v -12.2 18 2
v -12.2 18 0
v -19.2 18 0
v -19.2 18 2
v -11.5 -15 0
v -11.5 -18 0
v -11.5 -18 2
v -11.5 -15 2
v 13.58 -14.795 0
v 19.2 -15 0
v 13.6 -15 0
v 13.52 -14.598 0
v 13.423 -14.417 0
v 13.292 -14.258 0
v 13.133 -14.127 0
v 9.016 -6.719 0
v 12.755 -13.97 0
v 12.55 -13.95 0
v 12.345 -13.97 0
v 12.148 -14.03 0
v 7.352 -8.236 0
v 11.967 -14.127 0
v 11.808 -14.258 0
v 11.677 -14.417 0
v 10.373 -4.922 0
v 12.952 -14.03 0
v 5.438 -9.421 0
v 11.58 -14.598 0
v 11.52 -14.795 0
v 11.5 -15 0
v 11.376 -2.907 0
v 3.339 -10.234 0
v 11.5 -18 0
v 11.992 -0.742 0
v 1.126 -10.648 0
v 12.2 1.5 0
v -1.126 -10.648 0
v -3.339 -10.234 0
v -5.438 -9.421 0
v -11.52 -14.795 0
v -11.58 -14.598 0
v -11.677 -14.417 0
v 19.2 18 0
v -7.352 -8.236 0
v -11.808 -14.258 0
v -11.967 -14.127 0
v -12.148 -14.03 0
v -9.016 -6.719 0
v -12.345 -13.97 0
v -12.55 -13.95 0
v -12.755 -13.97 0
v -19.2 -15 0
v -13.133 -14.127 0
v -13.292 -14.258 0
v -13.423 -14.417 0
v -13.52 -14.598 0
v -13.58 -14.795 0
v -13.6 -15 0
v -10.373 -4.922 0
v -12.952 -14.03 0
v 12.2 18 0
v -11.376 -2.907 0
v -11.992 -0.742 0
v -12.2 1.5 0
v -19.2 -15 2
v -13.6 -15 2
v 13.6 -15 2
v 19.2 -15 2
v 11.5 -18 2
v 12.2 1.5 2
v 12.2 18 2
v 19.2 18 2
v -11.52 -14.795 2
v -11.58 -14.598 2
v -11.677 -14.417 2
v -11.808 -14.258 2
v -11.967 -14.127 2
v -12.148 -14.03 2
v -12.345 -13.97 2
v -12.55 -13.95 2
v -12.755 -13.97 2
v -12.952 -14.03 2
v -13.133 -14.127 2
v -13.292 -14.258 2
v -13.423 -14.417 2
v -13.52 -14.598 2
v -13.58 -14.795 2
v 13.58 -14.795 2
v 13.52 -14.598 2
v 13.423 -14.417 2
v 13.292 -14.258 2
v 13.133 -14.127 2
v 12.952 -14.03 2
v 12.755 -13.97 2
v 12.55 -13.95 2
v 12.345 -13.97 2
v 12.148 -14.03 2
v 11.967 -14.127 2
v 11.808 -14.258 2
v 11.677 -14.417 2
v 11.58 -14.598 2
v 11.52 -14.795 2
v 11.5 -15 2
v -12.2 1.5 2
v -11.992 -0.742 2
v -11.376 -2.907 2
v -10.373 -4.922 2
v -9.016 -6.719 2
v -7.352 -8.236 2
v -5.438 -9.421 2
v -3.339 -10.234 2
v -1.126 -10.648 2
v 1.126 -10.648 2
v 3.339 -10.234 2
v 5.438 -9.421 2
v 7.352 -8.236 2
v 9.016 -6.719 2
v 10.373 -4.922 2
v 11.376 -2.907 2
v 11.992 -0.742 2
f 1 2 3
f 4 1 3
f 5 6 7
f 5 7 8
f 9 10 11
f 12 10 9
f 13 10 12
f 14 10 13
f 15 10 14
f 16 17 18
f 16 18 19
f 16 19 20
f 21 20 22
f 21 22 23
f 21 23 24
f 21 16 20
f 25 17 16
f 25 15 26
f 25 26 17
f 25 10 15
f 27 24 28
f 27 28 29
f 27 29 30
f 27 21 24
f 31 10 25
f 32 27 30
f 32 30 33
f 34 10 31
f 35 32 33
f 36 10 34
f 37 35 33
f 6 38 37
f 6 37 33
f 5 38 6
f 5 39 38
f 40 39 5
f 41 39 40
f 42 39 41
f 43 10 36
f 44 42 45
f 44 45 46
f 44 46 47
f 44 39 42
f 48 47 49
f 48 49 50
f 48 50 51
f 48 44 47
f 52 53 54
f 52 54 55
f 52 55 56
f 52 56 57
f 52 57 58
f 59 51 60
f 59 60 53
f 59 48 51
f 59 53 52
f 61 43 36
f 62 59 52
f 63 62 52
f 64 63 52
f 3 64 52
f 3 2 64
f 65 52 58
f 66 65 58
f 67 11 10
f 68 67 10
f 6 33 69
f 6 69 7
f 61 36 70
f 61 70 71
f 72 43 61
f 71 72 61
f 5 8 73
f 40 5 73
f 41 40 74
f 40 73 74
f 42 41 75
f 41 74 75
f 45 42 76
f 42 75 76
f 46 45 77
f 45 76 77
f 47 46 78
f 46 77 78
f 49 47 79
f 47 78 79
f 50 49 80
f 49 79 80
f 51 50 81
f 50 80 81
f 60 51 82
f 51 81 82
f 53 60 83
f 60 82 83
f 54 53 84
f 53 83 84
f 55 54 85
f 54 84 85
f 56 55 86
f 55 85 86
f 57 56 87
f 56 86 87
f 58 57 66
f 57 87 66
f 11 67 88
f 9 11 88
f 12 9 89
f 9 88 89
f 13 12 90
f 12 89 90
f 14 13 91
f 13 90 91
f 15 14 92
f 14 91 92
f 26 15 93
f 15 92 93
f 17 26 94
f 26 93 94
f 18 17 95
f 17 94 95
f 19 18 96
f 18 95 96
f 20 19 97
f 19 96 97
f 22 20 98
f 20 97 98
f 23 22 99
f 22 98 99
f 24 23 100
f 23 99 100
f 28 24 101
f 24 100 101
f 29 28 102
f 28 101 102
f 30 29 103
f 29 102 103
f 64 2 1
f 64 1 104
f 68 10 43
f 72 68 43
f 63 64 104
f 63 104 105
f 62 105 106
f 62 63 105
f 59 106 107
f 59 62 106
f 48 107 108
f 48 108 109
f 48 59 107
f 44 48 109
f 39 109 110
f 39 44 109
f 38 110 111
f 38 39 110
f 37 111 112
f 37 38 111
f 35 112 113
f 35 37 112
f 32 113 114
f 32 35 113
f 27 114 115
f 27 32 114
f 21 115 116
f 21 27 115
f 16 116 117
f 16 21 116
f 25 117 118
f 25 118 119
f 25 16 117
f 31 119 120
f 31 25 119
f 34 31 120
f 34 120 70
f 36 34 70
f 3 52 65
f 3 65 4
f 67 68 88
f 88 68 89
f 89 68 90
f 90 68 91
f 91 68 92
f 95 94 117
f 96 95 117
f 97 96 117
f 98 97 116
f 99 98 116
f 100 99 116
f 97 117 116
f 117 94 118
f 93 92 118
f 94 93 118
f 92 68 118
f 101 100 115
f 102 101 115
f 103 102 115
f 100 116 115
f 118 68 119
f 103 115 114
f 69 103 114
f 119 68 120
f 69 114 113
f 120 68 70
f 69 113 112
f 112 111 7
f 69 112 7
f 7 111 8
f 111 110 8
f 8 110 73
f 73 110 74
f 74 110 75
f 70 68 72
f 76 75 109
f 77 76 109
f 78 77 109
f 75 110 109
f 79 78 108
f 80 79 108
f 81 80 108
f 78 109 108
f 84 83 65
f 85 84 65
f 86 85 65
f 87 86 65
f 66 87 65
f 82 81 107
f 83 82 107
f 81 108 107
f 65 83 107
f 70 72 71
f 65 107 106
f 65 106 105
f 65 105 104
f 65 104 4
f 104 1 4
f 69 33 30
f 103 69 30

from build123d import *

# Parameters (mm, degrees)
SKETCH_1_W          = 38.4
SKETCH_1_H          = 30
EXTRUDE_1_DEPTH     = 2
CUT_EXTRUDE_1_DEPTH = 2
SKETCH_3_W          = 23
SKETCH_3_H          = 6
EXTRUDE_2_DEPTH     = 2
SKETCH_4_R          = 1.05
CUT_EXTRUDE_2_DEPTH = 2
SKETCH_5_W          = 7
SKETCH_5_H          = 3
EXTRUDE_3_DEPTH     = 2


with BuildPart() as part:
    # 草图1 → 凸台-拉伸1 (new body)
    with BuildSketch(Plane.XY):
        Rectangle(SKETCH_1_W, SKETCH_1_H)
    extrude(amount=EXTRUDE_1_DEPTH)

    # 草图2 → 切除-拉伸1 (cut)
    with BuildSketch(Plane(origin=(0, 0, 0), x_dir=(-1, 0, 0), z_dir=(0, 0, -1))):
        with BuildLine():
            Line((-12.2, 1.5), (-12.2, 15))
            Line((-12.2, 15), (12.2, 15))
            Line((12.2, 15), (12.2, 1.5))
            ThreePointArc((12.2, 1.5), (0, -10.7), (-12.2, 1.5))
        make_face()
    extrude(amount=-CUT_EXTRUDE_1_DEPTH, mode=Mode.SUBTRACT)

    # 草图3 → 凸台-拉伸2 (add)
    with BuildSketch(Plane(origin=(0, 0, 0), x_dir=(-1, 0, 0), z_dir=(0, 0, -1))):
        with Locations((0, -15)):
            Rectangle(SKETCH_3_W, SKETCH_3_H)
    extrude(amount=-EXTRUDE_2_DEPTH)

    # 草图4 → 切除-拉伸2 (cut)
    with BuildSketch(Plane.XY.offset(2)):
        with Locations((12.55, -15)):
            Circle(SKETCH_4_R)
        with Locations((-12.55, -15)):
            Circle(SKETCH_4_R)
    extrude(amount=-CUT_EXTRUDE_2_DEPTH, mode=Mode.SUBTRACT)

    # 草图5 → 凸台-拉伸3 (add)
    with BuildSketch(Plane(origin=(0, 0, 0), x_dir=(-1, 0, 0), z_dir=(0, 0, -1))):
        with Locations((-15.7, 16.5)):
            Rectangle(SKETCH_5_W, SKETCH_5_H)
        with Locations((15.7, 16.5)):
            Rectangle(SKETCH_5_W, SKETCH_5_H)
    extrude(amount=-EXTRUDE_3_DEPTH)


solid = part.part
